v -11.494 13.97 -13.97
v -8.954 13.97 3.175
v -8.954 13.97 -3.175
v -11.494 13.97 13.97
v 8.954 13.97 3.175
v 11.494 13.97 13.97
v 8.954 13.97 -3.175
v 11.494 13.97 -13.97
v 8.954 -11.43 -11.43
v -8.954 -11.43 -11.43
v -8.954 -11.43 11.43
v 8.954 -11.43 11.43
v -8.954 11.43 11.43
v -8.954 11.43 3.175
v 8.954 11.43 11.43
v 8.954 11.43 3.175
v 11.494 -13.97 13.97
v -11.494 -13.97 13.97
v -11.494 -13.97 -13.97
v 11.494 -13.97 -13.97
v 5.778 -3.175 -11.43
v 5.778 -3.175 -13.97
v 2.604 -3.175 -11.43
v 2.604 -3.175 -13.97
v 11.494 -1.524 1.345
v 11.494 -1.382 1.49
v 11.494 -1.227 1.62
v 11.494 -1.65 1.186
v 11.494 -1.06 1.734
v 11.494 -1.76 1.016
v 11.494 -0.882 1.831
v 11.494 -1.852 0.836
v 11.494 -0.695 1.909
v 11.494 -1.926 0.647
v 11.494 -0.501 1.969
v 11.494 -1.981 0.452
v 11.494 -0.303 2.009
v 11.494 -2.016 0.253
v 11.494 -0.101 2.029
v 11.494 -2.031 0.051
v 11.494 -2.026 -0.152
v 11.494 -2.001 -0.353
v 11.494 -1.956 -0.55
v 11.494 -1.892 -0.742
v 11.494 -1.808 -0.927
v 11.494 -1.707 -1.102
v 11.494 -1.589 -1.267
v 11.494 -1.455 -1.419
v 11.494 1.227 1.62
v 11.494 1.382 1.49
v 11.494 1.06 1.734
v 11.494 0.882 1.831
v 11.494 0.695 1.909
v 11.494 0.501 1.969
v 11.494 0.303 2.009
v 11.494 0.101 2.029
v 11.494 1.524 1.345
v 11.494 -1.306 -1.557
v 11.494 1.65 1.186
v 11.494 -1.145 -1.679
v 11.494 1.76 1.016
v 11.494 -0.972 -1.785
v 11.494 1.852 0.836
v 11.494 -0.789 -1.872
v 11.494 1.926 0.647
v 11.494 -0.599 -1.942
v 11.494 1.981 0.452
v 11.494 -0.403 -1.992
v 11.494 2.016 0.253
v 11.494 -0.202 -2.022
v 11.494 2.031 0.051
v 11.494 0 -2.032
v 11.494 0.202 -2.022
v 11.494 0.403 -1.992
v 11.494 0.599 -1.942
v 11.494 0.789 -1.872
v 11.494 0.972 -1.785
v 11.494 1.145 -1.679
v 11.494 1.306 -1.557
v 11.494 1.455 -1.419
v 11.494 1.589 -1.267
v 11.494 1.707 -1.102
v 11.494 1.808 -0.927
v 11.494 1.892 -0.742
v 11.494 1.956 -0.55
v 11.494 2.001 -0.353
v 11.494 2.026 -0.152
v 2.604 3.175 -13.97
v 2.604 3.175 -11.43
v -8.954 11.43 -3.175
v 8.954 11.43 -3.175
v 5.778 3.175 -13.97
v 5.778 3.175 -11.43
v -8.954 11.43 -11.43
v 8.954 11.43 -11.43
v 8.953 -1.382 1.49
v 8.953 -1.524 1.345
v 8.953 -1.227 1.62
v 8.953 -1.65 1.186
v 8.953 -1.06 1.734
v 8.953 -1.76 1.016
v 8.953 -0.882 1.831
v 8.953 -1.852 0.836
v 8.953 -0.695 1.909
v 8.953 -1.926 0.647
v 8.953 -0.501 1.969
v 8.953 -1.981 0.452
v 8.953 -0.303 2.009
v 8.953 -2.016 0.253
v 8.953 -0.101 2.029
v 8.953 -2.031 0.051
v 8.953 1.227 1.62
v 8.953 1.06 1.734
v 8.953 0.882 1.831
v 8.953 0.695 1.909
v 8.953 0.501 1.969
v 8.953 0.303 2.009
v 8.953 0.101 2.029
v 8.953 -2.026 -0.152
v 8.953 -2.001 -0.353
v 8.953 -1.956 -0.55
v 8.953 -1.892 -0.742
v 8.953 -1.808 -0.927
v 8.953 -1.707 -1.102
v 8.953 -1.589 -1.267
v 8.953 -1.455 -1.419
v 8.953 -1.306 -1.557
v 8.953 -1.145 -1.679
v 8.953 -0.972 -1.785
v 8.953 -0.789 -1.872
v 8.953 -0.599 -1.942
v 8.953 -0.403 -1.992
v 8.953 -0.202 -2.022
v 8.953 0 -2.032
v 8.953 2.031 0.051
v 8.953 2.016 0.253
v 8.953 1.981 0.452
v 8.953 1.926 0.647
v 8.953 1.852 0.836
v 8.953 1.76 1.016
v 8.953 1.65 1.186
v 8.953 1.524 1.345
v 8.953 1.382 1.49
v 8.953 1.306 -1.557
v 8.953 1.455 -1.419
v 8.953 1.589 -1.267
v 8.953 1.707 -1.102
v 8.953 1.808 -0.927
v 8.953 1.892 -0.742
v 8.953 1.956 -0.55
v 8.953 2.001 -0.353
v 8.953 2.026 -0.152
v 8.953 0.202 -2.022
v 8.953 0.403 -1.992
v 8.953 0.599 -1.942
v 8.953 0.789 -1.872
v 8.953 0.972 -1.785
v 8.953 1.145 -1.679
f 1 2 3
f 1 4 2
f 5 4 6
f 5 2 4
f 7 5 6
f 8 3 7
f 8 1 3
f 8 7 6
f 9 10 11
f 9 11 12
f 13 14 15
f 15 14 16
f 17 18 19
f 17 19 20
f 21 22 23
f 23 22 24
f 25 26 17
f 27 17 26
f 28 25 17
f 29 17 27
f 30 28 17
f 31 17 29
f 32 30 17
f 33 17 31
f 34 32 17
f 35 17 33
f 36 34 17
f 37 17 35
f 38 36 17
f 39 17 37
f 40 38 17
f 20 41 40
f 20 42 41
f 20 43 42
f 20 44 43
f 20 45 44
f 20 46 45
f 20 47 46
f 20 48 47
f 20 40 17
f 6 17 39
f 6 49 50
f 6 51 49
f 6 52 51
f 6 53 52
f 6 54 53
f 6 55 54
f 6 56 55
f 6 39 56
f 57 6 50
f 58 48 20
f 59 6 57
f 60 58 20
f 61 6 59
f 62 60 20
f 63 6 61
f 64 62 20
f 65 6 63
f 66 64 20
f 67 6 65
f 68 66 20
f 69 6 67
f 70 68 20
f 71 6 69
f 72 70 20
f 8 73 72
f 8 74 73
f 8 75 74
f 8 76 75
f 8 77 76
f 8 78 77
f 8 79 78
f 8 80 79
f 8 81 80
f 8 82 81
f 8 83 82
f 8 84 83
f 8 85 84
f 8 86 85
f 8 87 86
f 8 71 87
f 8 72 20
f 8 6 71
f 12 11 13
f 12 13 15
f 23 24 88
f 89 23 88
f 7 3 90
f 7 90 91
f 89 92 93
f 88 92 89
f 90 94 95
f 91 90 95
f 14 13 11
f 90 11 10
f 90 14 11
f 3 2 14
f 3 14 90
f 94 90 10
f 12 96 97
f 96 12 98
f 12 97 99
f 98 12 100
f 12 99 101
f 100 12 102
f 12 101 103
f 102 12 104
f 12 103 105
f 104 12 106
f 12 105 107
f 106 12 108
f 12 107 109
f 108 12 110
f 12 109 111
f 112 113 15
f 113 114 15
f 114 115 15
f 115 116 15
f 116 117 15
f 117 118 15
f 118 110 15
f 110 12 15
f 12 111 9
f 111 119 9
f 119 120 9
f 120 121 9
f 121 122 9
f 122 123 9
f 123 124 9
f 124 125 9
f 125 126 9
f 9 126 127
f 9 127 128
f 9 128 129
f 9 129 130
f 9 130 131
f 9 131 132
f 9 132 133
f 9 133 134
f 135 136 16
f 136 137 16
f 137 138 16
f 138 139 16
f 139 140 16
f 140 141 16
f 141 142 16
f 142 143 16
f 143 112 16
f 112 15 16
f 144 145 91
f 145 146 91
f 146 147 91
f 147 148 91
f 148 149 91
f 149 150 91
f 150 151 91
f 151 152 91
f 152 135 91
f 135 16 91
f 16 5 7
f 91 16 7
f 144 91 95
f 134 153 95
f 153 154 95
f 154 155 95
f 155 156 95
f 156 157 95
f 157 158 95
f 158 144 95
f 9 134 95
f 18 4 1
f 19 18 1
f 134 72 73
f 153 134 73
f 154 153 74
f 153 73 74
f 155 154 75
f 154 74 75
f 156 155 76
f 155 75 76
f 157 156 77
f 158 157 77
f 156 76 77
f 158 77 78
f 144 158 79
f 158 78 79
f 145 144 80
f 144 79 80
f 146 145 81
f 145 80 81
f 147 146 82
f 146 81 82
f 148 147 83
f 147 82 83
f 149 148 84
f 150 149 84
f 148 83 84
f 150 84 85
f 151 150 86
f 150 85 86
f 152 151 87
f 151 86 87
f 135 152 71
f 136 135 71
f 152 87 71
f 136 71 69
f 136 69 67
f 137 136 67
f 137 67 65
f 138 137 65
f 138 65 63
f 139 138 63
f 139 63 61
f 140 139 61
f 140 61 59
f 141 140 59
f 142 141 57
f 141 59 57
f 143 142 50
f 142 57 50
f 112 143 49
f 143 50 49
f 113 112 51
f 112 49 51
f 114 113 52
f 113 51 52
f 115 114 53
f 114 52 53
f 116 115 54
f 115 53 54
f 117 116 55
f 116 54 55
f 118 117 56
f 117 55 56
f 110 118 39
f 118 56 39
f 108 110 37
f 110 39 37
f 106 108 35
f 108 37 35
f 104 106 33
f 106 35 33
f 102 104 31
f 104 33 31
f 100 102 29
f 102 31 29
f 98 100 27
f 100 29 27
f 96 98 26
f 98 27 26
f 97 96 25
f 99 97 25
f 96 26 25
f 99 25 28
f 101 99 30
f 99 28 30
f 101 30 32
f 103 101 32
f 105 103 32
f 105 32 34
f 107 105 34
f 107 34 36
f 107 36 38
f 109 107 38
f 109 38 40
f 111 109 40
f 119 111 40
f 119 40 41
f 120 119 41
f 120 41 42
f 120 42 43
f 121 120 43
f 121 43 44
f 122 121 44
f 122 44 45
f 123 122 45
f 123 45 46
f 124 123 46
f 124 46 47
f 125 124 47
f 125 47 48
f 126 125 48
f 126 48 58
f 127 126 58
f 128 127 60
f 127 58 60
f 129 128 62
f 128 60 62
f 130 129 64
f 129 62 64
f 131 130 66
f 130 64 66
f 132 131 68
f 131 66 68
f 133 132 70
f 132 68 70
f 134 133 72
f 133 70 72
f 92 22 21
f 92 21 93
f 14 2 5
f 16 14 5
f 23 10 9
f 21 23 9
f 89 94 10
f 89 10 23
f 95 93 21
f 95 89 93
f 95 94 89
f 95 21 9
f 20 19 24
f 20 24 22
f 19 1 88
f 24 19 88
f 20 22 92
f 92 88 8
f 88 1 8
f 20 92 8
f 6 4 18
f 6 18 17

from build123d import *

# Parameters (mm, degrees)
SKETCH2_W           = 22.987
SKETCH2_H           = 27.94
SKETCH2_W_2         = 17.907
SKETCH2_H_2         = 22.86
BOSS_EXTRUDE1_DEPTH = 13.97
SKETCH3_W           = 17.907
SKETCH3_H           = 22.86
BOSS_EXTRUDE2_DEPTH = 2.54
SKETCH4_W           = 17.907
SKETCH4_H           = 8.255
BOSS_EXTRUDE3_DEPTH = 2.54
SKETCH6_R           = 2.032
CUT_EXTRUDE2_DEPTH  = 2.54
SKETCH7_W           = 3.175
SKETCH7_H           = 6.35
CUT_EXTRUDE3_DEPTH  = 2.54


with BuildPart() as part:
    # Sketch2 → Boss-Extrude1 (new, symmetric)
    with BuildSketch(Plane(origin=(0, 0, 0), x_dir=(1, 0, 0), z_dir=(0, 1, 0))):
        Rectangle(SKETCH2_W, SKETCH2_H)
        Rectangle(SKETCH2_W_2, SKETCH2_H_2, mode=Mode.SUBTRACT)
    extrude(amount=BOSS_EXTRUDE1_DEPTH, both=True)

    # Sketch3 → Boss-Extrude2 (add)
    with BuildSketch(Plane.XZ.offset(13.97)):
        Rectangle(SKETCH3_W, SKETCH3_H)
    extrude(amount=-BOSS_EXTRUDE2_DEPTH)

    # Sketch4 → Boss-Extrude3 (add)
    with BuildSketch(Plane(origin=(0, 13.97, 0), x_dir=(1, 0, 0), z_dir=(0, 1, 0))):
        with Locations((0, 7.3025)):
            Rectangle(SKETCH4_W, SKETCH4_H)
        with Locations((0, -7.3025)):
            Rectangle(SKETCH4_W, SKETCH4_H)
    extrude(amount=-BOSS_EXTRUDE3_DEPTH)

    # Sketch6 → Cut-Extrude2 (cut)
    with BuildSketch(Plane(origin=(11.4935, 0, 0), x_dir=(0, 0, -1), z_dir=(1, 0, 0))):
        Circle(SKETCH6_R)
    extrude(amount=-CUT_EXTRUDE2_DEPTH, mode=Mode.SUBTRACT)

    # Sketch7 → Cut-Extrude3 (cut)
    with BuildSketch(Plane(origin=(0, 0, -13.97), x_dir=(-1, 0, 0), z_dir=(0, 0, -1))):
        with Locations((-4.191, 0)):
            Rectangle(SKETCH7_W, SKETCH7_H)
    extrude(amount=-CUT_EXTRUDE3_DEPTH, mode=Mode.SUBTRACT)


solid = part.part
